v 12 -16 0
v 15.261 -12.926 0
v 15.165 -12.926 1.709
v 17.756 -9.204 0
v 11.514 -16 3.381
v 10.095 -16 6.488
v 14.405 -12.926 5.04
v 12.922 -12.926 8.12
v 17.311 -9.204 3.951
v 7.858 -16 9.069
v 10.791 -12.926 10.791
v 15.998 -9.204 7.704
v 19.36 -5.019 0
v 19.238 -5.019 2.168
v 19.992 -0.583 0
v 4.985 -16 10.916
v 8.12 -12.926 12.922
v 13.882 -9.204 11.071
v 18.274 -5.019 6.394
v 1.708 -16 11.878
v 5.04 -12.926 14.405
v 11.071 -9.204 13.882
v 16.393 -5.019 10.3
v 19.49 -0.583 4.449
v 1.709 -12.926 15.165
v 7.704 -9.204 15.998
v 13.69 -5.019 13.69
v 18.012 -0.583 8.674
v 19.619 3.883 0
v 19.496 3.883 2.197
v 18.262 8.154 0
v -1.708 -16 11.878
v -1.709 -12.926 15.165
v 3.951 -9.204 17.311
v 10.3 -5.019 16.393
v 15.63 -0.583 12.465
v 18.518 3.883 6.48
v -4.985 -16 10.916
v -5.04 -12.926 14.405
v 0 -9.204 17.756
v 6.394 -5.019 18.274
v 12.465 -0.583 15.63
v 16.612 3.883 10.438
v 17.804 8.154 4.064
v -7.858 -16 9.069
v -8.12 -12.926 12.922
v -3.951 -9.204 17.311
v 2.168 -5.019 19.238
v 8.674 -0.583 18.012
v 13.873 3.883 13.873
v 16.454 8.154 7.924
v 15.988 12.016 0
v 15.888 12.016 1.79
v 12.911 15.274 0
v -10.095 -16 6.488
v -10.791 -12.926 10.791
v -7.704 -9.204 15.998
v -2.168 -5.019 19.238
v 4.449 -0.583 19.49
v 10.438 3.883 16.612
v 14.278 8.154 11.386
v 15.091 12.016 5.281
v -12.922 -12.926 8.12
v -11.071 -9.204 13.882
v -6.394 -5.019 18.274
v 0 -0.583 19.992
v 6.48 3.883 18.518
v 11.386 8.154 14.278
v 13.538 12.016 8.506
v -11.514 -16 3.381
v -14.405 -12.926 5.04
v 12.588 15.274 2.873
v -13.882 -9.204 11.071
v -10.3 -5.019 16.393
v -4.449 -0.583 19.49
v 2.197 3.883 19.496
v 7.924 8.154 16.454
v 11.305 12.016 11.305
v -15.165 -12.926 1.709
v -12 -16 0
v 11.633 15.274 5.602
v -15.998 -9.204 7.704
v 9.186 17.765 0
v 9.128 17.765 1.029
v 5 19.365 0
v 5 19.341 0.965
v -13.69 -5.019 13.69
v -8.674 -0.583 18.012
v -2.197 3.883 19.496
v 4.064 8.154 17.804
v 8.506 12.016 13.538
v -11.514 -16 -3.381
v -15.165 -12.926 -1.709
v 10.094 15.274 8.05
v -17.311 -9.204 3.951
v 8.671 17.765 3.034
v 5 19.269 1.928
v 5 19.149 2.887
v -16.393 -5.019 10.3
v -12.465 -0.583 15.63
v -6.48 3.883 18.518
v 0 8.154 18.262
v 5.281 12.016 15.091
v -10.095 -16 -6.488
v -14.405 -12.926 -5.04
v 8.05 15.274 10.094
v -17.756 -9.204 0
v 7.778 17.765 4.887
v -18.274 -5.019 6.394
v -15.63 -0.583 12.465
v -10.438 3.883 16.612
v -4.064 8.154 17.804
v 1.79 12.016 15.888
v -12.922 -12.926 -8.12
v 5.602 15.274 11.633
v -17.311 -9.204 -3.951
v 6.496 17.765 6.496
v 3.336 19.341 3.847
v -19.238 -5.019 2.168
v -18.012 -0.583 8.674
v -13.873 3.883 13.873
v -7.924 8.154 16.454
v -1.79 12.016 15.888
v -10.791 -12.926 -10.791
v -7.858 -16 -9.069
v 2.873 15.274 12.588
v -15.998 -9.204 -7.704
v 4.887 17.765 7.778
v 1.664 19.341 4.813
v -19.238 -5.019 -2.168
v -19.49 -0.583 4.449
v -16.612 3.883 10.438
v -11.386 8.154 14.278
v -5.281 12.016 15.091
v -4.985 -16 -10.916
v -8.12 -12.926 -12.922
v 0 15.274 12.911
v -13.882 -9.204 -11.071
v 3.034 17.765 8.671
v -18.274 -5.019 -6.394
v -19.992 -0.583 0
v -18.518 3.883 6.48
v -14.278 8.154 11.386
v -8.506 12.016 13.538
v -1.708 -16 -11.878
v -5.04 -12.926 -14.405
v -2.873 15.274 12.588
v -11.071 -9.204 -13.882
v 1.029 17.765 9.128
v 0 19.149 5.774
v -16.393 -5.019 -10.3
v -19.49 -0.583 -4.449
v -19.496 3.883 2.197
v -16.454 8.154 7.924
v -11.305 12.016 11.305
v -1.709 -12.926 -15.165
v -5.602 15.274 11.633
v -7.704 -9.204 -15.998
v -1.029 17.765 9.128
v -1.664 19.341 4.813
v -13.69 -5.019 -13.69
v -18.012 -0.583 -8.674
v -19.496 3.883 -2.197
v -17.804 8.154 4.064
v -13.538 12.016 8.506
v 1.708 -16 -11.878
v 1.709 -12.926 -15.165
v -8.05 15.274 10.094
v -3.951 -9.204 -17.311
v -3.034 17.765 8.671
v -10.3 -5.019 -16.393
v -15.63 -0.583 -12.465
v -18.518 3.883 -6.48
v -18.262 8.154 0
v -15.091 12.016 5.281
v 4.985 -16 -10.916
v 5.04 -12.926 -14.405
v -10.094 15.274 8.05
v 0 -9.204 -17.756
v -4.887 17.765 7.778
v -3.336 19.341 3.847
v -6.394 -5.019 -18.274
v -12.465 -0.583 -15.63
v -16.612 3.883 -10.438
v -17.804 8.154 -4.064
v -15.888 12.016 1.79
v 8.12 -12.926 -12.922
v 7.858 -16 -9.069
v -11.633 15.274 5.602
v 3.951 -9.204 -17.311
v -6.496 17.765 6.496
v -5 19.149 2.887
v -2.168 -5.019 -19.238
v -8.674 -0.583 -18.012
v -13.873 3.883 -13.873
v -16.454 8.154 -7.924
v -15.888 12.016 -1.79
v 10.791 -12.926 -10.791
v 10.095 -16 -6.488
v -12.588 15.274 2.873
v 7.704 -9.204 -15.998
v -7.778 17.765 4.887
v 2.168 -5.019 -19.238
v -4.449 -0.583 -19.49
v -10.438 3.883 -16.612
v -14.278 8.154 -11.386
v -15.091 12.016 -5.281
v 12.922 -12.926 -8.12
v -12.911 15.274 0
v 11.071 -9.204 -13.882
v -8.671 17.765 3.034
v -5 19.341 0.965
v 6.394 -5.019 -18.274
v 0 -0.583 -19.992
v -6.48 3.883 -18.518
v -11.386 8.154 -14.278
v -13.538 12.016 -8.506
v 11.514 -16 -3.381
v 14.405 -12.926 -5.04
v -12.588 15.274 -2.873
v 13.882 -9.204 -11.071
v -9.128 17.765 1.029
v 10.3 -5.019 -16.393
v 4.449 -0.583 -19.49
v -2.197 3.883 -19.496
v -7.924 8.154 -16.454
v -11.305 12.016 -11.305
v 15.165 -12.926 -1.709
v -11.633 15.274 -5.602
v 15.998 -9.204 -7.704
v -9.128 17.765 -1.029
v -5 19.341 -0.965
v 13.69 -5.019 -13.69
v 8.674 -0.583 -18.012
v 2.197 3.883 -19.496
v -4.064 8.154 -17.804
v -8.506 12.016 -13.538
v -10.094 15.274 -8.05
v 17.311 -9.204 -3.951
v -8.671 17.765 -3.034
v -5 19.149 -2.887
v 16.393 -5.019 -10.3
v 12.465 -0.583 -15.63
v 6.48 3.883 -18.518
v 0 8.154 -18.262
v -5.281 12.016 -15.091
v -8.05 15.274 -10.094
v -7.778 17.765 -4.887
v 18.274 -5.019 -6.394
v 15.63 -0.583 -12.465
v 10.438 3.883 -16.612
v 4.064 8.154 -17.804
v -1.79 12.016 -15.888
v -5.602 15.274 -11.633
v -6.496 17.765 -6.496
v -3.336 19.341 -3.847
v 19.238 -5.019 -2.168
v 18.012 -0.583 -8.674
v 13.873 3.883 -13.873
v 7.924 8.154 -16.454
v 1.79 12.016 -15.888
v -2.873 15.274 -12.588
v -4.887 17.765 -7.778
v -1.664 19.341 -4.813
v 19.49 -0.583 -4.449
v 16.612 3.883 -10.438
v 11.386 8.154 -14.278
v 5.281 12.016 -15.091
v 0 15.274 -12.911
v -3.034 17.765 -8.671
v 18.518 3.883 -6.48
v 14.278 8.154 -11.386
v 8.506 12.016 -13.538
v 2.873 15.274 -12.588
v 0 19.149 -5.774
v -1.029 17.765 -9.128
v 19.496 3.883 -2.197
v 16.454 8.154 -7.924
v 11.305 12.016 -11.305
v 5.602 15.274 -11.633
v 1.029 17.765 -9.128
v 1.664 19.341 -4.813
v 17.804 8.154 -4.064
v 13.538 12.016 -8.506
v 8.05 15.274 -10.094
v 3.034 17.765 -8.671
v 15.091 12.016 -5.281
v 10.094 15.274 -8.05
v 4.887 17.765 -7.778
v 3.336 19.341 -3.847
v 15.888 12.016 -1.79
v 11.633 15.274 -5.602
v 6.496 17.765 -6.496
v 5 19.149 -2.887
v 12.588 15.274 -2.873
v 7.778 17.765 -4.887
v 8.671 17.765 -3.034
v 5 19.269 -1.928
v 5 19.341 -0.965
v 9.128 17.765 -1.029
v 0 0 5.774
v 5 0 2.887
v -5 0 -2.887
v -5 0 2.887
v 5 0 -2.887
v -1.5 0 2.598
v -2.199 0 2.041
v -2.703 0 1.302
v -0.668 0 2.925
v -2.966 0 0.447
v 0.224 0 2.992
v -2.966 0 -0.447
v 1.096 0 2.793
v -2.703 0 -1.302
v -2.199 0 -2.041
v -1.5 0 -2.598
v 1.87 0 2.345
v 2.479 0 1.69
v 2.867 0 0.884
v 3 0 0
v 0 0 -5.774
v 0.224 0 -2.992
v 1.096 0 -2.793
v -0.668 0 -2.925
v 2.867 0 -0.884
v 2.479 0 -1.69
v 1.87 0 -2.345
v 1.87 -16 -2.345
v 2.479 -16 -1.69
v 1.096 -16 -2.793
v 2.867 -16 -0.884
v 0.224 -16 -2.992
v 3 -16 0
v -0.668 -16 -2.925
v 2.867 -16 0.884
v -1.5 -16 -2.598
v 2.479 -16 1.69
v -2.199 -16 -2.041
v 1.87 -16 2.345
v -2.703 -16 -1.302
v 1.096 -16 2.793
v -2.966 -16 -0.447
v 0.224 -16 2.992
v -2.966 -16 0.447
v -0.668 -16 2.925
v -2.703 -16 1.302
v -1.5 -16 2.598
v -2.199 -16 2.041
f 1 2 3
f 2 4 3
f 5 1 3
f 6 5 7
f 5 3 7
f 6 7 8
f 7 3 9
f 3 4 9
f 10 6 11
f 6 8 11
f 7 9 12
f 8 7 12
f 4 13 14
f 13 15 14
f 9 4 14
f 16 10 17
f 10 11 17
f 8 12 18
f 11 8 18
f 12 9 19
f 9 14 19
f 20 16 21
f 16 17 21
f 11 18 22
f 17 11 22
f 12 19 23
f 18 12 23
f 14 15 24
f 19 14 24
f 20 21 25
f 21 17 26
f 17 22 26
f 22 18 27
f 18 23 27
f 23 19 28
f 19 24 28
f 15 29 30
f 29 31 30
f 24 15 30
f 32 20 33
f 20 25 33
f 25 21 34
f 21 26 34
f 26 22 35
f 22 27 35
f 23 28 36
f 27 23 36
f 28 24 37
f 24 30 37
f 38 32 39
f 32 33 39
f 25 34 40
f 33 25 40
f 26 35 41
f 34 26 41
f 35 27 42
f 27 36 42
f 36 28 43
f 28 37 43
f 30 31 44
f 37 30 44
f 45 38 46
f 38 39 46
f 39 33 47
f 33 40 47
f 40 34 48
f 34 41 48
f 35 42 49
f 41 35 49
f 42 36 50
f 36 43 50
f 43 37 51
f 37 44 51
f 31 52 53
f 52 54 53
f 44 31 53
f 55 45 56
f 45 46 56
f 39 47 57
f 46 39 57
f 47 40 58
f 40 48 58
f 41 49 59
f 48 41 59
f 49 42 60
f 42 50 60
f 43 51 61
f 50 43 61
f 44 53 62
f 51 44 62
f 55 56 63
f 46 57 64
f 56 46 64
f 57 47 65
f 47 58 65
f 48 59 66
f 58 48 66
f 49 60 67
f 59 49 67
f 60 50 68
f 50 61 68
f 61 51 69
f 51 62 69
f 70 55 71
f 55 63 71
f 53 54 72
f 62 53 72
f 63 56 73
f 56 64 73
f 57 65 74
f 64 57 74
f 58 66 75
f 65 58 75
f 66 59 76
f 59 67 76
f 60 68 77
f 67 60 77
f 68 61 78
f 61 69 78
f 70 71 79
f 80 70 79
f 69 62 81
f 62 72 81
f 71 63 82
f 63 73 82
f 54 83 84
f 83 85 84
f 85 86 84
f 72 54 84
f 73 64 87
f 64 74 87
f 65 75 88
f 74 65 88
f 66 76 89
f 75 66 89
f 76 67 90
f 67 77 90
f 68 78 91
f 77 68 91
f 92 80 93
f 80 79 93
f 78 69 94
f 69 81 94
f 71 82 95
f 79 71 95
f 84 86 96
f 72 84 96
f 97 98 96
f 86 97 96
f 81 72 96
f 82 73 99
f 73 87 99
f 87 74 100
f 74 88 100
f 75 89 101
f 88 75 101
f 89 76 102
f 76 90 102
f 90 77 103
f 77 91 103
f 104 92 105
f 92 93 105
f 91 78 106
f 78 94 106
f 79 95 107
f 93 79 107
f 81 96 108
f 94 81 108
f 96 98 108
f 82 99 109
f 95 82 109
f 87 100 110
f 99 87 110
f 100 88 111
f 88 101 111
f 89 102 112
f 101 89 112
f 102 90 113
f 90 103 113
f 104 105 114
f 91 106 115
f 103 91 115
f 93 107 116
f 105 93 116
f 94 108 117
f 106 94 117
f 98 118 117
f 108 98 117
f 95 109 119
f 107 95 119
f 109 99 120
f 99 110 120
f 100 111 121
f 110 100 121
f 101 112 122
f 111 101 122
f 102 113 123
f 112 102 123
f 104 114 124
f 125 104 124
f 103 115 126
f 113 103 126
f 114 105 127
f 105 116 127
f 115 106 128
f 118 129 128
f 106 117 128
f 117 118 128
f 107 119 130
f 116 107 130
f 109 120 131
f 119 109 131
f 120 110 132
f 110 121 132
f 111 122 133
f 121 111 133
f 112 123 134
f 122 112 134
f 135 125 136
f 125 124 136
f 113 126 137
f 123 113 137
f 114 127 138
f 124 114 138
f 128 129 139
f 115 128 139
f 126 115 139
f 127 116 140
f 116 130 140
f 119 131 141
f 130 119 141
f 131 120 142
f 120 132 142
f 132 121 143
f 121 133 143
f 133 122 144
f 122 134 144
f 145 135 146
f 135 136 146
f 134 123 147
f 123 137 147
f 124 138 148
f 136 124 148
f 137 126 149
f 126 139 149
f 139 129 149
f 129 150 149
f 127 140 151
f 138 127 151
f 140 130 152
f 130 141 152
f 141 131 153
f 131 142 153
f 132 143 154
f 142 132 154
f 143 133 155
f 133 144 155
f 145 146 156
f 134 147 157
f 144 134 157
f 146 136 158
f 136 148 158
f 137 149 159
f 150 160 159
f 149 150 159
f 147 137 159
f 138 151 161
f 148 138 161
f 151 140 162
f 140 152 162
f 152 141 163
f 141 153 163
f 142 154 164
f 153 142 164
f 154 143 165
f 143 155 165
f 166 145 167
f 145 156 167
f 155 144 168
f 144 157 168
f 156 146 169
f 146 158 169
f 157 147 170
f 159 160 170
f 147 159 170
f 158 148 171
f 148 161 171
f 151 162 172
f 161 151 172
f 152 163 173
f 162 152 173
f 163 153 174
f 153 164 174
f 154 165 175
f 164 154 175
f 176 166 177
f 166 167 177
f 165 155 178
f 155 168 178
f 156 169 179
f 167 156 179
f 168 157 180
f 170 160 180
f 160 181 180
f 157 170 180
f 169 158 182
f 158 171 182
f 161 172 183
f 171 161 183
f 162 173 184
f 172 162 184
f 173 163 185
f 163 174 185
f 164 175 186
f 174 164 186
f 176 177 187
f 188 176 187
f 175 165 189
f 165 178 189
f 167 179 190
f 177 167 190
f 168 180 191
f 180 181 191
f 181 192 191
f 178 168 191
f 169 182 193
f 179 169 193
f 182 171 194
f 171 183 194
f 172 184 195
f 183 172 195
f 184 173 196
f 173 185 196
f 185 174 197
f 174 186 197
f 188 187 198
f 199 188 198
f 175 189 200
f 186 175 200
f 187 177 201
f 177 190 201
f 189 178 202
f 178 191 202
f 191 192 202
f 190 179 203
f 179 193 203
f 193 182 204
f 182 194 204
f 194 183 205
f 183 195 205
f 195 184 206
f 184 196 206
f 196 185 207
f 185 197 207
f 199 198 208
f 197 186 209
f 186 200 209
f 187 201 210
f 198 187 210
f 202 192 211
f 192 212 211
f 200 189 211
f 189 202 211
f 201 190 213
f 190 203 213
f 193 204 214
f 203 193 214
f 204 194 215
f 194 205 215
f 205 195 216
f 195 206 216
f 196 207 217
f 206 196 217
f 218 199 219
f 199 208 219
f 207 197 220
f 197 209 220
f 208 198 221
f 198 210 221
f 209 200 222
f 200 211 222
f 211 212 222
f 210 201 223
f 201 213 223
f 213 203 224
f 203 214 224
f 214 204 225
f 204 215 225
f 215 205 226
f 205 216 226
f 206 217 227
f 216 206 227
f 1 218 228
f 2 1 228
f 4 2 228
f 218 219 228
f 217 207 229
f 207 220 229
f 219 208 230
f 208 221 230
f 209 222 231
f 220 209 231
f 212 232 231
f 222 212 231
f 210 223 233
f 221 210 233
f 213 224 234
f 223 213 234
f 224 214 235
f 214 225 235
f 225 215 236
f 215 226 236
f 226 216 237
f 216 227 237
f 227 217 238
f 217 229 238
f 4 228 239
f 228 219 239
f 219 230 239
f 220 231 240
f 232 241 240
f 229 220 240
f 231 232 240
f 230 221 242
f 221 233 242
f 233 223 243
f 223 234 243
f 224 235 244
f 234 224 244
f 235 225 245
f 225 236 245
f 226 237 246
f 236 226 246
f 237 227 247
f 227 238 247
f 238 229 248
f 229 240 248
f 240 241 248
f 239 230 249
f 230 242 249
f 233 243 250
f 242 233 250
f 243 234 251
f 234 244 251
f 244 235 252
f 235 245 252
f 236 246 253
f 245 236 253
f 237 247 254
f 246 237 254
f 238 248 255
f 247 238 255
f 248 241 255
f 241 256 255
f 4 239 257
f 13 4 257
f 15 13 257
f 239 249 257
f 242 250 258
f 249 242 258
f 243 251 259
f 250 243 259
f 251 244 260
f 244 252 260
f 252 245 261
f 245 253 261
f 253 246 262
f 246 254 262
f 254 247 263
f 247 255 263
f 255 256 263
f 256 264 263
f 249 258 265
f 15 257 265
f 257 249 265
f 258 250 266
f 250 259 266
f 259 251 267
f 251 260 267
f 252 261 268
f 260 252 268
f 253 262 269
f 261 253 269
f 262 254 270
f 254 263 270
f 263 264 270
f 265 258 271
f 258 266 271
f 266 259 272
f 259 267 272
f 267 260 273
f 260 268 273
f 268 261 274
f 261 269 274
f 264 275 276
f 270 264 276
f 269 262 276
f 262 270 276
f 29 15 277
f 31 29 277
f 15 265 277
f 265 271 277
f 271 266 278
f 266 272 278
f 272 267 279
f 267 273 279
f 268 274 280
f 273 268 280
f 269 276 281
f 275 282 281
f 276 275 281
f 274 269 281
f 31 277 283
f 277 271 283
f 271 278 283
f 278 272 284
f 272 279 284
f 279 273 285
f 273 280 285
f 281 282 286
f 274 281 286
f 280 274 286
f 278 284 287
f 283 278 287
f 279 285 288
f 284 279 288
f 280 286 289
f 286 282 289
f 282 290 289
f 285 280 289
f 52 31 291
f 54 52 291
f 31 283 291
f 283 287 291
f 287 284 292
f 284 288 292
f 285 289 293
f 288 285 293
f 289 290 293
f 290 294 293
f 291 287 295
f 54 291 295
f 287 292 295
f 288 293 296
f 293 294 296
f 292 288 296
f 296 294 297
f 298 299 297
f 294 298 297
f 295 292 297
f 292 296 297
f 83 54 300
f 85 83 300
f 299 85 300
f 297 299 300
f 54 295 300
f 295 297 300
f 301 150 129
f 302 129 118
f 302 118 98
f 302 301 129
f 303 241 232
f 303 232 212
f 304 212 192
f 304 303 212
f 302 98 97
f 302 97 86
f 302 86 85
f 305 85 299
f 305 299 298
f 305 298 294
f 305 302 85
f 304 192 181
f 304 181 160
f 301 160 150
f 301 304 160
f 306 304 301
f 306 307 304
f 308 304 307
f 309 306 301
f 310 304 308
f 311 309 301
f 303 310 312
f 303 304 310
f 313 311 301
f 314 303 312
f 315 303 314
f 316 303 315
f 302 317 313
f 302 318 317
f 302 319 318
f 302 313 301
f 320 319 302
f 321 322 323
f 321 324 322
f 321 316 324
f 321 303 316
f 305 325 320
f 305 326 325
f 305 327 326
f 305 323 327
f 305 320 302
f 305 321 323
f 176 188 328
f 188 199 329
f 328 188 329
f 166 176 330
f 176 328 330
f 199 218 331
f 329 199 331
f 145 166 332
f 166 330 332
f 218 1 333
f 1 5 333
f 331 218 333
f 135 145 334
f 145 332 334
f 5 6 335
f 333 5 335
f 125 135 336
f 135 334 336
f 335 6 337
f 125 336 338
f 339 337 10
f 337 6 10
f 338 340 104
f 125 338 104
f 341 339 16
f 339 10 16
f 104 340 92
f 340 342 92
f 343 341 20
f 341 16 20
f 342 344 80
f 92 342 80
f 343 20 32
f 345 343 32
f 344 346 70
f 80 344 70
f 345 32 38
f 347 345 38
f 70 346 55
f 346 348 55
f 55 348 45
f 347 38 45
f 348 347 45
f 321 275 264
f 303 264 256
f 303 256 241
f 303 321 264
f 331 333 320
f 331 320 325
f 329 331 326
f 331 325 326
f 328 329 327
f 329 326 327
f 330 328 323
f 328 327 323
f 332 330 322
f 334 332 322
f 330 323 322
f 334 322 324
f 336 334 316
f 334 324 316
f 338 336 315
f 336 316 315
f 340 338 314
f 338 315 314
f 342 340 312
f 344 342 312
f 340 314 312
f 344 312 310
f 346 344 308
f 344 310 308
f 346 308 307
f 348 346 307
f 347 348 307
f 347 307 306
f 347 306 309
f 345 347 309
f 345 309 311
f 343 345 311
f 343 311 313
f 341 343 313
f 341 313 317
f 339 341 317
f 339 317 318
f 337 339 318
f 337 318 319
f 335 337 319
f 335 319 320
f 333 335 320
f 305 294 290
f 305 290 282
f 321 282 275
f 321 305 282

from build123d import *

# Parameters (mm, degrees)
ENL_V_MAT_EXTRU_1_DEPTH      = 21
ESQUISSE3_R                  = 3
ENL_V_MAT_EXTRU_2_DEPTH      = 21
ENL_V_MAT_EXTRU_3_DEPTH      = 21
ENL_V_MAT_EXTRU_3_DEPTH_BACK = 21


with BuildPart() as part:
    # Esquisse1 → Révolution1 (revolve)
    with BuildSketch(Plane.XY):
        with BuildLine():
            Line((0, 20), (0, -20))
            ThreePointArc((0, -20), (20, 0), (0, 20))
        make_face()
    revolve(axis=Axis((0, 38.8303663, 0), (0, -1, 0)))

    # Esquisse2 → Enlèv. mat.-Extru.1 (cut, through all)
    with BuildSketch(Plane(origin=(0, 0, 0), x_dir=(1, 0, 0), z_dir=(0, 1, 0))):
        Polygon((5, -2.886751346), (5, 2.886751346), (0, 5.773502692), (-5, 2.886751346), (-5, -2.886751346), (0, -5.773502692), align=None)
    extrude(amount=ENL_V_MAT_EXTRU_1_DEPTH, mode=Mode.SUBTRACT)

    # Esquisse3 → Enlèv. mat.-Extru.2 (cut, through all)
    with BuildSketch(Plane(origin=(0, 0, 0), x_dir=(1, 0, 0), z_dir=(0, 1, 0))):
        Circle(ESQUISSE3_R)
    extrude(amount=-ENL_V_MAT_EXTRU_2_DEPTH, mode=Mode.SUBTRACT)

    # Esquisse5 → Enlèv. mat.-Extru.3 (cut, two sides)
    with BuildSketch(Plane.XY) as enl_v_mat_extru_3_sk:
        Polygon((188.012399008, -16), (31.726859594, -16), (-44.024896915, -16), (-200.310436329, -16), (-200.310436329, -328.571078828), (188.012399008, -328.571078828), align=None)
    extrude(amount=ENL_V_MAT_EXTRU_3_DEPTH, mode=Mode.SUBTRACT)
    extrude(enl_v_mat_extru_3_sk.sketch, amount=-ENL_V_MAT_EXTRU_3_DEPTH_BACK, mode=Mode.SUBTRACT)


solid = part.part
